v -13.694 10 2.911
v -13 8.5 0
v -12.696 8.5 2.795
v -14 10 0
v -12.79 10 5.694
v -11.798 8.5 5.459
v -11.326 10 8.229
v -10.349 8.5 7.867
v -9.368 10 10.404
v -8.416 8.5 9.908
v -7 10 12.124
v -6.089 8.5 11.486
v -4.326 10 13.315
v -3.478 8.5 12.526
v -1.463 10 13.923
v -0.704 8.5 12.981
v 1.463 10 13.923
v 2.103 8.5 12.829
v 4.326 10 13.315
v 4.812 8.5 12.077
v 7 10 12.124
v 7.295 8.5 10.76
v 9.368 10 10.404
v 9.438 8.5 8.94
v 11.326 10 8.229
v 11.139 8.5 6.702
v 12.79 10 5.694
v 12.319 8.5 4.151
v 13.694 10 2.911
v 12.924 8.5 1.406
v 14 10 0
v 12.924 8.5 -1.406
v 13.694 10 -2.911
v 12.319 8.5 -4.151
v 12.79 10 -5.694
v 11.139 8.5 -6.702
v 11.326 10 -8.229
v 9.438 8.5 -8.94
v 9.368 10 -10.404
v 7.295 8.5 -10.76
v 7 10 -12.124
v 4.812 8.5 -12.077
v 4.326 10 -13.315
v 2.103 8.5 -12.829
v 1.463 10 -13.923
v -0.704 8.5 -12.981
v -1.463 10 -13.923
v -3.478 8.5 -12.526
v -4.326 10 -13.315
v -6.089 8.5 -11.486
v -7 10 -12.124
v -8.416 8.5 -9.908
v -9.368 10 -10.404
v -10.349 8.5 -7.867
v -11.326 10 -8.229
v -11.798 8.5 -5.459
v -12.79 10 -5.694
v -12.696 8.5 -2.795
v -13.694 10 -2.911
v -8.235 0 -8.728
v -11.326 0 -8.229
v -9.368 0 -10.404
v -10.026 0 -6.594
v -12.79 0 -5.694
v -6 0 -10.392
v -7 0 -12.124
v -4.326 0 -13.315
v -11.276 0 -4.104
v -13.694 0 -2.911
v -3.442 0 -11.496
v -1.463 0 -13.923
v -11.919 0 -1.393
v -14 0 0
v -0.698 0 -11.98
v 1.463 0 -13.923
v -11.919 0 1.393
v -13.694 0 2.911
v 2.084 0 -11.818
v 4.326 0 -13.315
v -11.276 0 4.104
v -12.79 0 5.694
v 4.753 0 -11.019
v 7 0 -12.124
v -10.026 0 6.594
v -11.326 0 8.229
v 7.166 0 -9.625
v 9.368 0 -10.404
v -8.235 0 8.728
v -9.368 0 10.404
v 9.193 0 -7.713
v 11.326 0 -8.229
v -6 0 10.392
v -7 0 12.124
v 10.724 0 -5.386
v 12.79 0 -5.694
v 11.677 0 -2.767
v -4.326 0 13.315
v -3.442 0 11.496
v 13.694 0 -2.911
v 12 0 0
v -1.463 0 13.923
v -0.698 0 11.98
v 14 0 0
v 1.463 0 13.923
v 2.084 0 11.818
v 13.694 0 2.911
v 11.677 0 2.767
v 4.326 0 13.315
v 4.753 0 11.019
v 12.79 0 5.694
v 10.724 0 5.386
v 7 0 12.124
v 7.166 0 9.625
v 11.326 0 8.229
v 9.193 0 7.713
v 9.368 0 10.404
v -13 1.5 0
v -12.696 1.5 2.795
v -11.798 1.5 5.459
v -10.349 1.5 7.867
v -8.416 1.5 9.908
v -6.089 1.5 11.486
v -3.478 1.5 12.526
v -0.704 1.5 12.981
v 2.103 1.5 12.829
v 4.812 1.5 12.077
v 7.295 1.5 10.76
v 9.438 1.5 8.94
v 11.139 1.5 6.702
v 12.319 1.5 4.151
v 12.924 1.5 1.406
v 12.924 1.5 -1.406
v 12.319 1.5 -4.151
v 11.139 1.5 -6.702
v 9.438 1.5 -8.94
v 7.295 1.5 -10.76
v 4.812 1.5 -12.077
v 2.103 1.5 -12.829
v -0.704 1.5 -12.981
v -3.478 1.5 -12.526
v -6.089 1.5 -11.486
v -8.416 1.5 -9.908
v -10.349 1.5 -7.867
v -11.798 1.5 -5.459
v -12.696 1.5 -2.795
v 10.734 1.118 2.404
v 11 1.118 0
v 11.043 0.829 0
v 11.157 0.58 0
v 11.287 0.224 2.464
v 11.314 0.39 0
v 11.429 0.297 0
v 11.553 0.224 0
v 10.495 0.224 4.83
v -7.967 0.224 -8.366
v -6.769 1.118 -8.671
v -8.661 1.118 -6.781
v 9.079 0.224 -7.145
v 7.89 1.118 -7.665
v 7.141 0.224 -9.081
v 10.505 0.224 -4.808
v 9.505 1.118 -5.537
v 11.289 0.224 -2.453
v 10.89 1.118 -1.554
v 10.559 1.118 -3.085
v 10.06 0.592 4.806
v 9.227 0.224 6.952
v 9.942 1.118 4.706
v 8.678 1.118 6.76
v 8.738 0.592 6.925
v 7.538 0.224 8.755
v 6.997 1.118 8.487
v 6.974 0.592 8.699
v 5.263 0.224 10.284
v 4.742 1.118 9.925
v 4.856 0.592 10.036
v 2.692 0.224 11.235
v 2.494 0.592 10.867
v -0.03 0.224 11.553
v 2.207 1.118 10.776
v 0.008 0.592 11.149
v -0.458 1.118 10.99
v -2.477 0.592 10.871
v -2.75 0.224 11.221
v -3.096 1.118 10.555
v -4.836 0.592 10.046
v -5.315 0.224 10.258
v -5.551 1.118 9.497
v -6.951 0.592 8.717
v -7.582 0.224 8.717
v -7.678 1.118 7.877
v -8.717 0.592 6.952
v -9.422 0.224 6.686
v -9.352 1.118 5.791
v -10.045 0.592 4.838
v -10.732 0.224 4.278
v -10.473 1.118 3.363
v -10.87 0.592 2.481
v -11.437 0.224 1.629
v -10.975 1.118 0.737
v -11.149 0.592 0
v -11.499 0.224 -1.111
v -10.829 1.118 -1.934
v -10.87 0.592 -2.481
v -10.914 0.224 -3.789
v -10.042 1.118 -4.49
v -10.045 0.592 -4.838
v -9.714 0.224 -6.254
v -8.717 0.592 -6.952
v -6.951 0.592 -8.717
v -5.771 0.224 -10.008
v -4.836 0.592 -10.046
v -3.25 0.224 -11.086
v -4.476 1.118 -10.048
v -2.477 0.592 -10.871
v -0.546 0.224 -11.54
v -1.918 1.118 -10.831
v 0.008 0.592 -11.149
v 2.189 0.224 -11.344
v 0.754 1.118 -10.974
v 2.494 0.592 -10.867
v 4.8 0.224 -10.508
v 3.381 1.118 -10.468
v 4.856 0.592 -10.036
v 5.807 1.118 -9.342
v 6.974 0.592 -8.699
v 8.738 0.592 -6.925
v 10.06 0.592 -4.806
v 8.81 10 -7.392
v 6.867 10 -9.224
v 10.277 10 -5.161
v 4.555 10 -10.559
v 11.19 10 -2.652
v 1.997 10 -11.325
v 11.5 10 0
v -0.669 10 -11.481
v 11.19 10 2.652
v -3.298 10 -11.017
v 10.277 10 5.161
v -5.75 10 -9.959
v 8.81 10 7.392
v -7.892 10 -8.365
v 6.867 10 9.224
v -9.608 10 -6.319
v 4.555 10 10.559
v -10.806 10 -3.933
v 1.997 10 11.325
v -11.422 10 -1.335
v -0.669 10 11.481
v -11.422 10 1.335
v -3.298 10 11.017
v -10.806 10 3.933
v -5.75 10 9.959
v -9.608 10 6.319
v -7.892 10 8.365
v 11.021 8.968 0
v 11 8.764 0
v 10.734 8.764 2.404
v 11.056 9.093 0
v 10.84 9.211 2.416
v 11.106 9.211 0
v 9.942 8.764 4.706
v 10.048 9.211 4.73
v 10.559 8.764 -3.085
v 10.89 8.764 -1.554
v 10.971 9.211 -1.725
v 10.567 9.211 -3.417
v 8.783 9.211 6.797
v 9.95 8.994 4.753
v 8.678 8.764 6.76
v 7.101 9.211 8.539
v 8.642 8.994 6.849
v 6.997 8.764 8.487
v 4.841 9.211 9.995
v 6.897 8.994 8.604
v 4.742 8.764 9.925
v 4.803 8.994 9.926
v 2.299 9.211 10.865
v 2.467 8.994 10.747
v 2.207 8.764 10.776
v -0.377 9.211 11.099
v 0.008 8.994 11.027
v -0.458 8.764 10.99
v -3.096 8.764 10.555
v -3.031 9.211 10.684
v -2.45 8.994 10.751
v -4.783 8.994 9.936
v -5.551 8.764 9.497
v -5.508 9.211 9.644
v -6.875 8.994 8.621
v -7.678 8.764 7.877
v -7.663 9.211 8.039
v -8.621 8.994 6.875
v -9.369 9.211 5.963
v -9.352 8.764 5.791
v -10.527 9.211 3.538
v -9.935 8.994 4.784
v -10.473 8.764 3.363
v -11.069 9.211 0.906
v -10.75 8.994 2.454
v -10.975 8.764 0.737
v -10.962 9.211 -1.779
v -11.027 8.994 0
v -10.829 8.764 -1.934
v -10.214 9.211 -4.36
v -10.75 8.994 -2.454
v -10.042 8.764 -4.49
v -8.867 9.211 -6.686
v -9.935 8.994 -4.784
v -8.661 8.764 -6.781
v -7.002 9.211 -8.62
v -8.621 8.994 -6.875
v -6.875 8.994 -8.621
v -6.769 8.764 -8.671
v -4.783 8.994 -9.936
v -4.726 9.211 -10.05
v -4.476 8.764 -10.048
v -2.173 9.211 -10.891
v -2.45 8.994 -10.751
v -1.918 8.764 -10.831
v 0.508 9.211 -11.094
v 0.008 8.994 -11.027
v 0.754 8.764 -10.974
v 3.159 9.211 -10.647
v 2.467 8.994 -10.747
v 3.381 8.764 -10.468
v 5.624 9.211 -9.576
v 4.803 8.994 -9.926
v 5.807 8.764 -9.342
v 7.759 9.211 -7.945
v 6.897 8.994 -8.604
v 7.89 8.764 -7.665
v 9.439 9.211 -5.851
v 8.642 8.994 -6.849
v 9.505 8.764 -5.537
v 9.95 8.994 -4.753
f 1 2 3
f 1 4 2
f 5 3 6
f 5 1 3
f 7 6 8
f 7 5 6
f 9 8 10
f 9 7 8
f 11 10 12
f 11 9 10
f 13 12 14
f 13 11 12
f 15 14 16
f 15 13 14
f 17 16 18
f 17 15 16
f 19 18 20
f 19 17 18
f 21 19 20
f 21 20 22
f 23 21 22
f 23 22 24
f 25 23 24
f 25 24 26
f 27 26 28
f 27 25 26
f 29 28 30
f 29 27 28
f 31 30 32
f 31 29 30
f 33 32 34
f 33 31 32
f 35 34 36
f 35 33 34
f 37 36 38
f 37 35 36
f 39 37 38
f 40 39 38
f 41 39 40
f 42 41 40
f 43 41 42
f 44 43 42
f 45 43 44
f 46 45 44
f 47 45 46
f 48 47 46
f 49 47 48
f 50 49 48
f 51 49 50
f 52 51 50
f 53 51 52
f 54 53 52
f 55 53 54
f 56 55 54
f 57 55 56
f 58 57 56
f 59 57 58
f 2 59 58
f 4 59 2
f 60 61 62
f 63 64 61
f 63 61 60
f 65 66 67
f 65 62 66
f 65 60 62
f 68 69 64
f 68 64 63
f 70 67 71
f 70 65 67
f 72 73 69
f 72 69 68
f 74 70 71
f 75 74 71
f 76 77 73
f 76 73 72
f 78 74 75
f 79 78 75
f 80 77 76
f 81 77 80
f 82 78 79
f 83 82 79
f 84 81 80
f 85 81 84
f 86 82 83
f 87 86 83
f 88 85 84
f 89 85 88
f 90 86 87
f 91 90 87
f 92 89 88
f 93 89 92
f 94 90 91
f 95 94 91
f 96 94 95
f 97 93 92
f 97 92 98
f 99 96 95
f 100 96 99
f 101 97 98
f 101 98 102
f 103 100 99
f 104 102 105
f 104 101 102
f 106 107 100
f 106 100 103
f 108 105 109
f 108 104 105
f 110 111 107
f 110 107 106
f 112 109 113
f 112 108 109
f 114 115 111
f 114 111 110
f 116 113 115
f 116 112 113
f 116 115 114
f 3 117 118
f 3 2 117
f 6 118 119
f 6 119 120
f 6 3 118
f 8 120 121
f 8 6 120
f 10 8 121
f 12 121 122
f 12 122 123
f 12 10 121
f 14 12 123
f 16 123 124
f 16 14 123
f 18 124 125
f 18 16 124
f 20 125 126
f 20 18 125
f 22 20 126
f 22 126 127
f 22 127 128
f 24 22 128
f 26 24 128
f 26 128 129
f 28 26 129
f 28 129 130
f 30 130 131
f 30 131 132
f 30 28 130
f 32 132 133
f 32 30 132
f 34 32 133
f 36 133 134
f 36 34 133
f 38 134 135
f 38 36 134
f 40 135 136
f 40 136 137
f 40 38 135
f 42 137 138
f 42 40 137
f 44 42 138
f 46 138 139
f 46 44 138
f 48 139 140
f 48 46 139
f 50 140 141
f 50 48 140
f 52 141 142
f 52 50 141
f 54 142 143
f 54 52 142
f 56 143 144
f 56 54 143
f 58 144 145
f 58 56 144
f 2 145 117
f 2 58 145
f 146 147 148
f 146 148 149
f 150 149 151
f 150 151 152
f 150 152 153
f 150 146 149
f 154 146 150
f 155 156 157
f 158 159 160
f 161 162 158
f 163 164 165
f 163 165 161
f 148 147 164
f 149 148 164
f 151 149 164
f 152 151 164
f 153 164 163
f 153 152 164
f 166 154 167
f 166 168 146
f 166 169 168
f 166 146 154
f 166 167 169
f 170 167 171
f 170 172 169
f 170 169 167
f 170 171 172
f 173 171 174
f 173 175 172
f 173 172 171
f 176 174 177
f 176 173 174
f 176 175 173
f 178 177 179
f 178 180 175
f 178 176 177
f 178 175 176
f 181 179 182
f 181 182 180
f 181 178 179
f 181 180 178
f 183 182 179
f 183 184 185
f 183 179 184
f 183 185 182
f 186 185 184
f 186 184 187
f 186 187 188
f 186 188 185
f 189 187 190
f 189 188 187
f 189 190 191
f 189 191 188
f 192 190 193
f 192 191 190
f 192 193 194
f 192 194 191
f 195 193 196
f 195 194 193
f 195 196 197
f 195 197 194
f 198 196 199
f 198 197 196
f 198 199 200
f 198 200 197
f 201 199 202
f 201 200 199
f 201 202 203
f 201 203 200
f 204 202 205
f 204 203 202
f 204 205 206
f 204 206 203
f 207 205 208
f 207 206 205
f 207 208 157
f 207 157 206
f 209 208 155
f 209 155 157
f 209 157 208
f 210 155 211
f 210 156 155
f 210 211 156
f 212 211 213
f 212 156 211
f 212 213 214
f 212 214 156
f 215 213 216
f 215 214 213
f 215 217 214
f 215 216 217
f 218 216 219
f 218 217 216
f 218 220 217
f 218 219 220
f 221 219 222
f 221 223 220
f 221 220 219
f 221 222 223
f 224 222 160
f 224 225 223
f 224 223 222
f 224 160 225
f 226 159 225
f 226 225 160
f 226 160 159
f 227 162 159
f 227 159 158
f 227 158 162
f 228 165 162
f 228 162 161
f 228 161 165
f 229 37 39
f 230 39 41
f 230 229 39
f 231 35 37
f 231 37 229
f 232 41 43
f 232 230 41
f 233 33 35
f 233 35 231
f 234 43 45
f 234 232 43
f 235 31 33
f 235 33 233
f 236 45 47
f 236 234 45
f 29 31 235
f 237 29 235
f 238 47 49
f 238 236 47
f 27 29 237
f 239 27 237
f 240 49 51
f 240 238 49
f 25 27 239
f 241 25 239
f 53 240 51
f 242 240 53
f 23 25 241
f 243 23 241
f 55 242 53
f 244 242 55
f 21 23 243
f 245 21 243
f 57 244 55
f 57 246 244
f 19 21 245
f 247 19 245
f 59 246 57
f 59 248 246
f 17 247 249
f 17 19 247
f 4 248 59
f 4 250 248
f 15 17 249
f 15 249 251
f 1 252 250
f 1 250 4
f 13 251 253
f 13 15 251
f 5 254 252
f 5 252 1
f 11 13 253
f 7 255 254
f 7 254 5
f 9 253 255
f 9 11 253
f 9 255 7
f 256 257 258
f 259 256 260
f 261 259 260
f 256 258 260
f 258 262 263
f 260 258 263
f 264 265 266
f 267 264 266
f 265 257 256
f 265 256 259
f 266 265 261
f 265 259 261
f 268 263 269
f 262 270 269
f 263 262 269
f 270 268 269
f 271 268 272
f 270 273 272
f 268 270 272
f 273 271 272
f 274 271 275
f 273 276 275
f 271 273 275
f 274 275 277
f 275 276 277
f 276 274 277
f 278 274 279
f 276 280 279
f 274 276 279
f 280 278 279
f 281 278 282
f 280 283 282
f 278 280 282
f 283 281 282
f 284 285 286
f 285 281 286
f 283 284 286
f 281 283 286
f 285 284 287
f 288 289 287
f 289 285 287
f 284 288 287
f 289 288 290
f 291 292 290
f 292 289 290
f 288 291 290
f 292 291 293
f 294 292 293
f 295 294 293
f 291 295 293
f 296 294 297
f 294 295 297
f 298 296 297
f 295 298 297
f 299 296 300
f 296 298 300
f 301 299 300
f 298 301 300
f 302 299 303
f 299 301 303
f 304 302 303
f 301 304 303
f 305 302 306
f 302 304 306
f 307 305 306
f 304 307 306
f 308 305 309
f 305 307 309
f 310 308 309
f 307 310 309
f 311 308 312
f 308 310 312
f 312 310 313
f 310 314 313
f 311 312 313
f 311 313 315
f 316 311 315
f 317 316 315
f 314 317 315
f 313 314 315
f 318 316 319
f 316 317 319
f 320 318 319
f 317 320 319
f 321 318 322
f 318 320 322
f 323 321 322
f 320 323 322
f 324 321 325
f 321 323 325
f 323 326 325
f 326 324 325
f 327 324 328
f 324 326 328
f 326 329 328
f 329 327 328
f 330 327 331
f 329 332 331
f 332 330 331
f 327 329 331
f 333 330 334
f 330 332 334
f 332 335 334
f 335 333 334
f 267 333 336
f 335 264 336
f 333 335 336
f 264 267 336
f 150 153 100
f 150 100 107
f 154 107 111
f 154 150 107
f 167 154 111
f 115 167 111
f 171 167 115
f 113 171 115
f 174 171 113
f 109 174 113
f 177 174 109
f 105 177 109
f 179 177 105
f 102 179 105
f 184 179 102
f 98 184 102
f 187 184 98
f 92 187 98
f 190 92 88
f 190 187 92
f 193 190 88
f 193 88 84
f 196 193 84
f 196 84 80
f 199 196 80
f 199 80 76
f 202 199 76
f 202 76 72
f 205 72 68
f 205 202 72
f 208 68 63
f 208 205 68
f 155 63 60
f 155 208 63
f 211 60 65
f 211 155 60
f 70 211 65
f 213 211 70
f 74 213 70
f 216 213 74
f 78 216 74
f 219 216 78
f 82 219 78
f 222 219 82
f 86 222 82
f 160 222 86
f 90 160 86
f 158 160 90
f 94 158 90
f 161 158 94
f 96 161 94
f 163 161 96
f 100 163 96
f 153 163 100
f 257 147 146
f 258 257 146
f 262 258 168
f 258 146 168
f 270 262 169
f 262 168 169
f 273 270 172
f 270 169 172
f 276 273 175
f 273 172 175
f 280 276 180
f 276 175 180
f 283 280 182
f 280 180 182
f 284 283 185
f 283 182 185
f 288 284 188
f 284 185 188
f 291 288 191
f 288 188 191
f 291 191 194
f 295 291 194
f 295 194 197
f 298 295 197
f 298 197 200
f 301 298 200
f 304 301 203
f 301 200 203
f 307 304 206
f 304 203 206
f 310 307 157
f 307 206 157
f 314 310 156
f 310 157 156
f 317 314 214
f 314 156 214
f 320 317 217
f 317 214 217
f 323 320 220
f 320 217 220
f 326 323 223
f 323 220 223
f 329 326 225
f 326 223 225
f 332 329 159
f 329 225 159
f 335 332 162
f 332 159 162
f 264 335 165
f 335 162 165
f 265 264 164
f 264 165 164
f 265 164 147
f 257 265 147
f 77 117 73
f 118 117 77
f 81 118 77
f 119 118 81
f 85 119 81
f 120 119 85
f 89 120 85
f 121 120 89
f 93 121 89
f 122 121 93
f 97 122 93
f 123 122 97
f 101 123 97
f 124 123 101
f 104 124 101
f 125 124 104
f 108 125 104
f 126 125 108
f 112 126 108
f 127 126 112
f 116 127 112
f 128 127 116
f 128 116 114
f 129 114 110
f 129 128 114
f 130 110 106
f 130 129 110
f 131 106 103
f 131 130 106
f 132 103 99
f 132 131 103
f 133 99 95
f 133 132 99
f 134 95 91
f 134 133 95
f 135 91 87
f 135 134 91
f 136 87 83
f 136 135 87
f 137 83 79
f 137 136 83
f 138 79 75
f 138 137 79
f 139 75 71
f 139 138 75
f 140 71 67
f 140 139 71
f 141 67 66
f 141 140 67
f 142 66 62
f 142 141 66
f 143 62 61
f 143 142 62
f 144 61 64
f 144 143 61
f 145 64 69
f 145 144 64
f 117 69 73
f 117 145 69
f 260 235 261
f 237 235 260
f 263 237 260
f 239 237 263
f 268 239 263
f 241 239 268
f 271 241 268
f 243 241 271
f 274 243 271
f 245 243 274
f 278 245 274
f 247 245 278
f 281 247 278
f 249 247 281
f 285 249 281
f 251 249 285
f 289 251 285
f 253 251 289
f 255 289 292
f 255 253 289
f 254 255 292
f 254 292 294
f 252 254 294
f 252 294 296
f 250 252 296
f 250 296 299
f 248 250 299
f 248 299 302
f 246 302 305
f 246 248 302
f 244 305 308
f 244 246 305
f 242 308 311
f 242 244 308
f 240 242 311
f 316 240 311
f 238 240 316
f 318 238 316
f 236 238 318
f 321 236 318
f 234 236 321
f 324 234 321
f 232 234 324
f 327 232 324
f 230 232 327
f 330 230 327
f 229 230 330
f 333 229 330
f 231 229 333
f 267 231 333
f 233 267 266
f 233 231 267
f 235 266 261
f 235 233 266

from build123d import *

# Parameters (mm, degrees)
SKETCH001_R     = 11
POCKET_DEPTH    = 10
CHAMFER_1_SIZE2 = 0.5
CHAMFER_1_SIZE  = 1
CHAMFER_2_SIZE2 = 0.5
CHAMFER_2_SIZE  = 1
FILLET_R        = 1


with BuildPart() as part:
    # Sketch → Revolution (revolve)
    with BuildSketch(Plane.XY):
        Polygon((0, 0), (-14, 0), (-13, 1.5), (-13, 8.5), (-14, 10), (0, 10), align=None)
    revolve(axis=Axis((0, 0, 0), (0, 1, 0)))

    # Sketch001 (on Face1 of Revolution) → Pocket (cut)
    with BuildSketch(Plane.XZ):
        Circle(SKETCH001_R)
    extrude(amount=-POCKET_DEPTH, mode=Mode.SUBTRACT)

    # Chamfer 1
    chamfer_1_edges = [part.edges().sort_by_distance(p)[0] for p in [
        (-11, 10, 0),
    ]]
    chamfer_1_side = part.faces().sort_by_distance((-11, 5, 0))[0]
    chamfer(chamfer_1_edges, length=CHAMFER_1_SIZE, length2=CHAMFER_1_SIZE2, reference=chamfer_1_side)

    # Chamfer 2
    chamfer_2_edges = [part.edges().sort_by_distance(p)[0] for p in [
        (-11, 0, 0),
    ]]
    chamfer_2_side = part.faces().sort_by_distance((13.60402, 0, 0))[0]
    chamfer(chamfer_2_edges, length=CHAMFER_2_SIZE, length2=CHAMFER_2_SIZE2, reference=chamfer_2_side)

    # Fillet
    fillet_edges = [part.edges().sort_by_distance(p)[0] for p in [
        (-11, 9, 0),
        (-11, 0.5, 0),
    ]]
    fillet(fillet_edges, radius=FILLET_R)


solid = part.part
